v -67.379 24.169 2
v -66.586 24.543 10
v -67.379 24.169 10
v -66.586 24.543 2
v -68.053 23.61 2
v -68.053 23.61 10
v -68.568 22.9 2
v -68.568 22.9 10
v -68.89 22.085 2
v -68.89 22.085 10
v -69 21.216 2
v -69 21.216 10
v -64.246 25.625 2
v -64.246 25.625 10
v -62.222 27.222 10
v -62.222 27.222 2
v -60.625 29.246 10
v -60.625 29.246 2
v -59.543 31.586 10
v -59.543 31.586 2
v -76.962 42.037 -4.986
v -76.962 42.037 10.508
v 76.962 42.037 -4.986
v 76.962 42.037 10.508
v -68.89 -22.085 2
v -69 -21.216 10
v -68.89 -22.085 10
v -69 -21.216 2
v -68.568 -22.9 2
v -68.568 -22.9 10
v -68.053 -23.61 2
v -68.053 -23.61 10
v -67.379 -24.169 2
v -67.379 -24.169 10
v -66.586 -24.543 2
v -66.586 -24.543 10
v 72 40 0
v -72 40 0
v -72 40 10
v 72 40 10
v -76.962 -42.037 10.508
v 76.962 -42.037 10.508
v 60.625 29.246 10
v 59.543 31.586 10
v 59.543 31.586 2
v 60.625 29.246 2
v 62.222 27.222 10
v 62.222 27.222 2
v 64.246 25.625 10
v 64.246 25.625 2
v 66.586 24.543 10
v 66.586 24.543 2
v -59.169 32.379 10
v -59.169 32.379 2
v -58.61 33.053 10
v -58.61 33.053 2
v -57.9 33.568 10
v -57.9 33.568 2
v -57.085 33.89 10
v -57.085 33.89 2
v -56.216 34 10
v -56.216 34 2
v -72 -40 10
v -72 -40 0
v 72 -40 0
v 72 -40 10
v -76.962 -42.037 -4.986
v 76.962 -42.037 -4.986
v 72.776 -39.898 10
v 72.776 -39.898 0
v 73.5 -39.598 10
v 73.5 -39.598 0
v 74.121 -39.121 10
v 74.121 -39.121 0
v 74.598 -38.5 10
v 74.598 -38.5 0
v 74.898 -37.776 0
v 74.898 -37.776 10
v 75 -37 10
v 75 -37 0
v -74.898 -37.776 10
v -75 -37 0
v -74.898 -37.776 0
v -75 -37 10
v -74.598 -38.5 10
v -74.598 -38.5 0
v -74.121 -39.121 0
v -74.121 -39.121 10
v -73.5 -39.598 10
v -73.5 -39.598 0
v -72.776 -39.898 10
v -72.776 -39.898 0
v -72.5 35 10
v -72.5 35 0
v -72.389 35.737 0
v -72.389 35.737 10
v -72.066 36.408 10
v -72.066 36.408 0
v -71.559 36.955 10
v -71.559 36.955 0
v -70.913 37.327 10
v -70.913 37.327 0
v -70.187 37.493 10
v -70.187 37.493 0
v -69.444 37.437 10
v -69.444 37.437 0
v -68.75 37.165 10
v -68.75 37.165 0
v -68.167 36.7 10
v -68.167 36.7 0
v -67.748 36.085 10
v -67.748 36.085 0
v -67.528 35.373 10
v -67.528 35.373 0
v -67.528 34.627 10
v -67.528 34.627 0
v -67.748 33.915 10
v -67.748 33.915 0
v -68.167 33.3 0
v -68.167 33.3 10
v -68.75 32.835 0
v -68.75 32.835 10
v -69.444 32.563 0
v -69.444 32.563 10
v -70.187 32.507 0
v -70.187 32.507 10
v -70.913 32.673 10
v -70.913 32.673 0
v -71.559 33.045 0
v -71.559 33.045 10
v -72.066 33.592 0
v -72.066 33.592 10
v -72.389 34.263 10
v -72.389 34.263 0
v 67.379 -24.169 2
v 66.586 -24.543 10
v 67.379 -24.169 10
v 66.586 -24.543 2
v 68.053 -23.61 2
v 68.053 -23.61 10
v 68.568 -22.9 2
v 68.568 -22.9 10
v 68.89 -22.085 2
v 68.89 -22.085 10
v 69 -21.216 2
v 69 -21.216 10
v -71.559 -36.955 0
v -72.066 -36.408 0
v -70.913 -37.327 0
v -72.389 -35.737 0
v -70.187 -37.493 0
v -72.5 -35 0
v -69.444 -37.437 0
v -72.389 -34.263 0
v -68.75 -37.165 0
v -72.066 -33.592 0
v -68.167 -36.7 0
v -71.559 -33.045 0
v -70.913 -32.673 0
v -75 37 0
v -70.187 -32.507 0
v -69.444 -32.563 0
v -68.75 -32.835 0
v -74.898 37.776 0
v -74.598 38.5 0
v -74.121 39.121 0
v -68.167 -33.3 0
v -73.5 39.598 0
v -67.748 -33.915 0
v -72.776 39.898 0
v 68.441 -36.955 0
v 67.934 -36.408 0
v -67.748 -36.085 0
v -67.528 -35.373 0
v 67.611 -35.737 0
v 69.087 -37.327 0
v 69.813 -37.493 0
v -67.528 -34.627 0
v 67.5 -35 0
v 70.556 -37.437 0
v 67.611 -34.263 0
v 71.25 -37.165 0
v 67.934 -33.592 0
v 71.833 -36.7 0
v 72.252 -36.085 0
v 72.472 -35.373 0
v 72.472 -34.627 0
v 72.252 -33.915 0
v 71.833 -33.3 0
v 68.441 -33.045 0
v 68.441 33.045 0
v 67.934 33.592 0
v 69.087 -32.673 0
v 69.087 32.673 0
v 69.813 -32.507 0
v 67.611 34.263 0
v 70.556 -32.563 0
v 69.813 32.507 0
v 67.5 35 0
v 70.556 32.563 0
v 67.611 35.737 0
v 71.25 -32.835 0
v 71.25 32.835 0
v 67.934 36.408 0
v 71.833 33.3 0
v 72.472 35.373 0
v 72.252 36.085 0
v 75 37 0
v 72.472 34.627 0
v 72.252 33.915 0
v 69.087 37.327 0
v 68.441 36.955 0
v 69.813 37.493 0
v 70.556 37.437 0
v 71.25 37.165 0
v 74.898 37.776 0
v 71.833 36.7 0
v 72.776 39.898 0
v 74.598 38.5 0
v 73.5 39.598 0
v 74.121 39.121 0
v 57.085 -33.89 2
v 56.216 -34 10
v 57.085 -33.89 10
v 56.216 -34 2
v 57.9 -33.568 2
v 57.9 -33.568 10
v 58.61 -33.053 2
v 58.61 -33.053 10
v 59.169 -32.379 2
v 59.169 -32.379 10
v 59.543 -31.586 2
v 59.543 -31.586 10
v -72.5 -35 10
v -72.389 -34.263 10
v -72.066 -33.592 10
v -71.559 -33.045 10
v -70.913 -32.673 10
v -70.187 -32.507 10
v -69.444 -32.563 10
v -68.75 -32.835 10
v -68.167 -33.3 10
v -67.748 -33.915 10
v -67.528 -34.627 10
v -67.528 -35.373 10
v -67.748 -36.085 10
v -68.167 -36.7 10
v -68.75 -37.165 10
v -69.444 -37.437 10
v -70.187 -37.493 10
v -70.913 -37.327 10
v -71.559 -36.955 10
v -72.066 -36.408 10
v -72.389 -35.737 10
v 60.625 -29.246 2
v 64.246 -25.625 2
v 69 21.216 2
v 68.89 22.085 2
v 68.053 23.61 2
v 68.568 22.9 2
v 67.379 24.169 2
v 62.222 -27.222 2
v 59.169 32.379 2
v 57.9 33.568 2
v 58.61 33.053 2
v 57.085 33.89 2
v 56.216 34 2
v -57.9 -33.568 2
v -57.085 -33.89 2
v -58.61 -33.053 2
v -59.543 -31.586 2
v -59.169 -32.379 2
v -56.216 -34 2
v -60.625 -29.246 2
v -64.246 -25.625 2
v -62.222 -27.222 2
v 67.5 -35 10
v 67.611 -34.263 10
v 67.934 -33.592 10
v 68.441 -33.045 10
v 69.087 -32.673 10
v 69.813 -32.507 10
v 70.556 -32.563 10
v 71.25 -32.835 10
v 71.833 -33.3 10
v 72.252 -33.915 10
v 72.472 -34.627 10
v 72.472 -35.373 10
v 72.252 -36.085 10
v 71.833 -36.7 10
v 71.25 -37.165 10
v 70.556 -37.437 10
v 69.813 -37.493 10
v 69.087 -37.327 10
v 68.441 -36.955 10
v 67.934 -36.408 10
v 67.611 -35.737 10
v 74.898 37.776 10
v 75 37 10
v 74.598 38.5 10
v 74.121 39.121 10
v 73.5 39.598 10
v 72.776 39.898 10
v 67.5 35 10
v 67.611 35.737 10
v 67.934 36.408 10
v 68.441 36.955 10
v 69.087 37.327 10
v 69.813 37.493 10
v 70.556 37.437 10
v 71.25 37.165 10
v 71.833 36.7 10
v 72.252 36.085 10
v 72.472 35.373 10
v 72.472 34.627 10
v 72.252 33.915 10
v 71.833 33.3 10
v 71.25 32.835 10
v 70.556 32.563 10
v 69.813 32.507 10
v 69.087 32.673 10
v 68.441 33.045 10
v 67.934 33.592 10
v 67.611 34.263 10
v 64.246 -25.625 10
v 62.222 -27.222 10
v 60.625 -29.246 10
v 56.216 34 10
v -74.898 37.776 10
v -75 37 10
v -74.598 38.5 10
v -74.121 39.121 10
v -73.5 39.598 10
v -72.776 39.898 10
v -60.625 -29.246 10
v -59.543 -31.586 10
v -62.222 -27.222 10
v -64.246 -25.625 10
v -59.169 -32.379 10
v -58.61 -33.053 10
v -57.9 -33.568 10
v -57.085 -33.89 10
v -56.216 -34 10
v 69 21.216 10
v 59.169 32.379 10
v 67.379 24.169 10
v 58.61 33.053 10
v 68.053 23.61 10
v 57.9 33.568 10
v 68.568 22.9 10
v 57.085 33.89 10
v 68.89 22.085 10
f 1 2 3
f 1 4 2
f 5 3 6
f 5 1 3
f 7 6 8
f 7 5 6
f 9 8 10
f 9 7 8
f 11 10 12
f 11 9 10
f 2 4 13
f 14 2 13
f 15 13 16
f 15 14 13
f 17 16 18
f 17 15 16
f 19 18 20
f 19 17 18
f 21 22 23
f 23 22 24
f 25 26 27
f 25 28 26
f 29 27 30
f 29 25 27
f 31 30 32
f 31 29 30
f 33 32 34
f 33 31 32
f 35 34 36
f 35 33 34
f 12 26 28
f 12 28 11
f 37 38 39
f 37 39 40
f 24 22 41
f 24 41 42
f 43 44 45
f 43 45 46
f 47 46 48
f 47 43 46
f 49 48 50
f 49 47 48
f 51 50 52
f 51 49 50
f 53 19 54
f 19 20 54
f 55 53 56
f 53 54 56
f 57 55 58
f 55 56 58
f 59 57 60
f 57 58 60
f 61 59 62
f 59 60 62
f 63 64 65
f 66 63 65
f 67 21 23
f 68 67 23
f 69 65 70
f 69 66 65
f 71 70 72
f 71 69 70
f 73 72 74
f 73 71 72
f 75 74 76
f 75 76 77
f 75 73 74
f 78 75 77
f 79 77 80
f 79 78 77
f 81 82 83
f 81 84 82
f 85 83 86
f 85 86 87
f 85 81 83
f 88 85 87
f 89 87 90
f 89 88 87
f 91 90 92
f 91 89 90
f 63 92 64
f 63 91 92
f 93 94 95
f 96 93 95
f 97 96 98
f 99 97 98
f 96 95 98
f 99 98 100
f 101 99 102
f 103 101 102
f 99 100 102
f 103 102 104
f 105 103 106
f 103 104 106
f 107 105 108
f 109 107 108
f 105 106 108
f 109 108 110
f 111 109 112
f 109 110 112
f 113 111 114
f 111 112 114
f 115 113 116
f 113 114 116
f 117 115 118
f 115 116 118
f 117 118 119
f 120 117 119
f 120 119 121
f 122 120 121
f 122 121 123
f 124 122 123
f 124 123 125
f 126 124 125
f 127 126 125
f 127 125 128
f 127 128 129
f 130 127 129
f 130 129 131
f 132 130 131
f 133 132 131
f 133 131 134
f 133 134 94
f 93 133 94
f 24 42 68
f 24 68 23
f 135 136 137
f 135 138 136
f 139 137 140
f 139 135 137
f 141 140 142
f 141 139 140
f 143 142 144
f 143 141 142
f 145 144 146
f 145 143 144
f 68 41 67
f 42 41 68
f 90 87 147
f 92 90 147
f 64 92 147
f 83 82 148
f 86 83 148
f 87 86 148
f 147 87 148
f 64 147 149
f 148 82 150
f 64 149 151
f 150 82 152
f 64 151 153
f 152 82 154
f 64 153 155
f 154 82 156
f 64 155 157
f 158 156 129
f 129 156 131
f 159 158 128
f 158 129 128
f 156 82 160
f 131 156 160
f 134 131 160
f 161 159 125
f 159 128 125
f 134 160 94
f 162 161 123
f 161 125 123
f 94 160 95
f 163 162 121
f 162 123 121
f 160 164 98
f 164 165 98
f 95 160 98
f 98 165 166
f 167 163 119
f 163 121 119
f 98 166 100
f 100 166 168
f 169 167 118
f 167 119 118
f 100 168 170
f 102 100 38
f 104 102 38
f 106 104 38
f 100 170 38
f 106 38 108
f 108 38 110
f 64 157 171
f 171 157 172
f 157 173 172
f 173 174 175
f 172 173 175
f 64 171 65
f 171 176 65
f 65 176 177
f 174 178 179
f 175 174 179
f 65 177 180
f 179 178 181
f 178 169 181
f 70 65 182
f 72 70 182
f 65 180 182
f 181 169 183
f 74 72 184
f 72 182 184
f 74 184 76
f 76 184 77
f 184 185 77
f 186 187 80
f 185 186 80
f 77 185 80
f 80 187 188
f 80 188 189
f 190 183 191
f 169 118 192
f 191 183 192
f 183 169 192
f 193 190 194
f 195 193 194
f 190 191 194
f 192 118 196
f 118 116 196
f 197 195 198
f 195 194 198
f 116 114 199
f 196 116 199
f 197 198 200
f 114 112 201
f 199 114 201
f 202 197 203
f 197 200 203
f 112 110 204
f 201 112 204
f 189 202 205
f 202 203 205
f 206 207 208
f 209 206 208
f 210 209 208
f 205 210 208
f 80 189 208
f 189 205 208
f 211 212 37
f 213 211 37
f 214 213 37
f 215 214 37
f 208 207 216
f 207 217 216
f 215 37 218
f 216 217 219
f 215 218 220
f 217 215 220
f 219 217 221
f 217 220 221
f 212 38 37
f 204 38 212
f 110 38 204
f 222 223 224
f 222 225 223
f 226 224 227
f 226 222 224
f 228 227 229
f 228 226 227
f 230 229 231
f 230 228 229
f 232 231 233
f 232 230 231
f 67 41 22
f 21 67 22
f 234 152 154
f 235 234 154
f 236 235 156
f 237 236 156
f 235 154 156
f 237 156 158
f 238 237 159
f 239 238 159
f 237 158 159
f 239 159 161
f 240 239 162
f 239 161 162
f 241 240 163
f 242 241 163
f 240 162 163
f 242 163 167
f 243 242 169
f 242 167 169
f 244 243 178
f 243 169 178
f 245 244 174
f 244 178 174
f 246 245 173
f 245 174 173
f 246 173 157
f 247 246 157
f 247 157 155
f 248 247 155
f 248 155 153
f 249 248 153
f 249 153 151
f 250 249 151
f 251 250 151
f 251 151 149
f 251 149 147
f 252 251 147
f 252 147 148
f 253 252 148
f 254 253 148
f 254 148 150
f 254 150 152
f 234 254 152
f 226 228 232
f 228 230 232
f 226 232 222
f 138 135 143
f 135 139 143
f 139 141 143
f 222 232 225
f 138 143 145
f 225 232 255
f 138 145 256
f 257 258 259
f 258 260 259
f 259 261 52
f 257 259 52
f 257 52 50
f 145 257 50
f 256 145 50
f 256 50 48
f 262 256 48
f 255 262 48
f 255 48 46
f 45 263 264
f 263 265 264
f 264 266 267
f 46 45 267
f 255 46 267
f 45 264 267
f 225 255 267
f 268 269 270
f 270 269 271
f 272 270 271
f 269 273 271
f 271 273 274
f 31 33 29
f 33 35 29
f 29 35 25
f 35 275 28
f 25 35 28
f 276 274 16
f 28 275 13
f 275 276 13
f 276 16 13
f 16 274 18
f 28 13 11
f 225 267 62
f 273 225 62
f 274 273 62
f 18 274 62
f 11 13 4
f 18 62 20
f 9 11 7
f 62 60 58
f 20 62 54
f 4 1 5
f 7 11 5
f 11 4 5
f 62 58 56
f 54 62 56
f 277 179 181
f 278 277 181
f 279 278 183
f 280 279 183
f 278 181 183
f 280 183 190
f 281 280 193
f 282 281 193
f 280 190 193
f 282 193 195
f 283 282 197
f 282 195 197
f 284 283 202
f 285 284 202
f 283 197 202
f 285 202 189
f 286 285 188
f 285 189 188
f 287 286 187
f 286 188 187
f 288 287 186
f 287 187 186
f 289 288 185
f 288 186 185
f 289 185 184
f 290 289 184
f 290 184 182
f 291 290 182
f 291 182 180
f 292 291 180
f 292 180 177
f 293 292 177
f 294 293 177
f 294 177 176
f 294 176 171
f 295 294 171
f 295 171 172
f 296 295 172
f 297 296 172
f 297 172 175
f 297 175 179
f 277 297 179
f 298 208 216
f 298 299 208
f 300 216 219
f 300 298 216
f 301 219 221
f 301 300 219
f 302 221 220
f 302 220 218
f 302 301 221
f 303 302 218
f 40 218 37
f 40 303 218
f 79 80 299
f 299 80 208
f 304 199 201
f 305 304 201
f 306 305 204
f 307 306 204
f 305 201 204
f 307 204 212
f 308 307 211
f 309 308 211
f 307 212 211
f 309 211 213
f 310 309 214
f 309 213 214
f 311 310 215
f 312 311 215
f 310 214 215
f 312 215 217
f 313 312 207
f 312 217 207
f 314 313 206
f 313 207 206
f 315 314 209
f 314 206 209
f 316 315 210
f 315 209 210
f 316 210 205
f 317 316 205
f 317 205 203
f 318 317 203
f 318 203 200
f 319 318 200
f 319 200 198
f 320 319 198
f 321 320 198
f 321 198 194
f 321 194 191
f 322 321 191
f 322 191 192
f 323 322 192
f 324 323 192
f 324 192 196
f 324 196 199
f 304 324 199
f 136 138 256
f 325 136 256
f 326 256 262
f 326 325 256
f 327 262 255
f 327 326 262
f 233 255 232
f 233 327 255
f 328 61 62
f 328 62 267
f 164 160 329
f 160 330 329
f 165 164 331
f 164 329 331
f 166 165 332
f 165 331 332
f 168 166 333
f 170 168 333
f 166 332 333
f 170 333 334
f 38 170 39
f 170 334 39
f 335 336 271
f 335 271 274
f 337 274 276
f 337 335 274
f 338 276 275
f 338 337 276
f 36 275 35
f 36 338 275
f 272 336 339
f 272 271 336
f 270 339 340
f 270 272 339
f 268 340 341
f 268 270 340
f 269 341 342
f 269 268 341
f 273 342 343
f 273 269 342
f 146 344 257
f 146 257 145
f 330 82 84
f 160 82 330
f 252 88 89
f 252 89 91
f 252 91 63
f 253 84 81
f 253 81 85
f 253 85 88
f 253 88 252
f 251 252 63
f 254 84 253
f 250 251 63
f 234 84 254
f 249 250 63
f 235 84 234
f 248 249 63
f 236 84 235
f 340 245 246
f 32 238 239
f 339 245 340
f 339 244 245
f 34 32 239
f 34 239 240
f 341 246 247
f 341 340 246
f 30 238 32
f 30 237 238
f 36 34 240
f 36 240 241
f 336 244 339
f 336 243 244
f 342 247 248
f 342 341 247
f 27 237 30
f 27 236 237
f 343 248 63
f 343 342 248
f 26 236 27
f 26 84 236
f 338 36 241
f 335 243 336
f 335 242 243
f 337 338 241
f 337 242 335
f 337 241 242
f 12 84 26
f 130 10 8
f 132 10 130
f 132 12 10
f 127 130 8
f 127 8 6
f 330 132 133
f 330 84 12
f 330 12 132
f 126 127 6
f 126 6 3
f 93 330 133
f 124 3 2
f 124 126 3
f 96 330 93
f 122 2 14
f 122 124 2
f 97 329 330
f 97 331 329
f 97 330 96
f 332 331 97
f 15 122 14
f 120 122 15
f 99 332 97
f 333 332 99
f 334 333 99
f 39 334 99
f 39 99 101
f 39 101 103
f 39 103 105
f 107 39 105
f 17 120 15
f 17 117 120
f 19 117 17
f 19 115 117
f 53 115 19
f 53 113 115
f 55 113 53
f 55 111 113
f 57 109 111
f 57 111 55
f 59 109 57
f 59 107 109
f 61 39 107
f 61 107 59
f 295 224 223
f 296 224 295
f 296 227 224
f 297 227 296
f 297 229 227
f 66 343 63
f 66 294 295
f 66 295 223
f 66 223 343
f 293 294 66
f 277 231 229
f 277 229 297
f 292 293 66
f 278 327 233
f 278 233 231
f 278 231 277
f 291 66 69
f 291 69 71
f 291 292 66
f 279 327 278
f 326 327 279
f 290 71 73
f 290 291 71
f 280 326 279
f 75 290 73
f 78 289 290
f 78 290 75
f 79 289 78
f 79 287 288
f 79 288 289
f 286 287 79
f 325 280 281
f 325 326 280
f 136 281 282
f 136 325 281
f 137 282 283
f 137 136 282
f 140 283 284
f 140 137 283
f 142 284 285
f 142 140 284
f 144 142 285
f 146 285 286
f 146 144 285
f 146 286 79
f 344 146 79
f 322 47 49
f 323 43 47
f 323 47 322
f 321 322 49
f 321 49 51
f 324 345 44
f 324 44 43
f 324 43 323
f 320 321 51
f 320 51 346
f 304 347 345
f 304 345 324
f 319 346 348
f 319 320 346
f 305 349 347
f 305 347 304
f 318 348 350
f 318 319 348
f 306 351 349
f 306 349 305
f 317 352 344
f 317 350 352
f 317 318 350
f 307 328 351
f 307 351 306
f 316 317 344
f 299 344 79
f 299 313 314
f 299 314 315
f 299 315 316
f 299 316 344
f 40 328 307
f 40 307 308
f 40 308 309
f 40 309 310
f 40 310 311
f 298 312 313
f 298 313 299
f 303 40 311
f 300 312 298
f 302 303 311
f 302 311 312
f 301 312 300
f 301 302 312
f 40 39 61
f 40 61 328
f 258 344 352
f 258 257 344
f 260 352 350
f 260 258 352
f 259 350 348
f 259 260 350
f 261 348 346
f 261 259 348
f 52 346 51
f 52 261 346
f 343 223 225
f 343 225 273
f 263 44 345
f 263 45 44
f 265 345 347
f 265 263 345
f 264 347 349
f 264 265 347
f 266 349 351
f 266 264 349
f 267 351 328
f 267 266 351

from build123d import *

# Parameters (mm, degrees)
SKETCH1_W                = 150
SKETCH1_H                = 80
BOSS_EXTRUDE1_DEPTH      = 10
FILLET1_R                = 3
F_5_0_5_DIAMETER_HOLE1_D = 5
CUT_EXTRUDE1_DEPTH       = 8
FILLET2_R                = 3.5
SKETCH8_W                = 153.924
SKETCH8_H                = 84.074
BOSS_EXTRUDE3_DEPTH      = 0.508
BOSS_EXTRUDE3_DEPTH_BACK = 14.986


with BuildPart() as part:
    # Sketch1 → Boss-Extrude1 (new body)
    with BuildSketch(Plane.XY):
        Rectangle(SKETCH1_W, SKETCH1_H)
    extrude(amount=BOSS_EXTRUDE1_DEPTH)

    # Fillet1
    fillet1_edges = [part.edges().sort_by_distance(p)[0] for p in [
        (75, -40, 5),
        (-75, -40, 5),
        (-75, 40, 5),
        (75, 40, 5),
    ]]
    fillet(fillet1_edges, radius=FILLET1_R)

    # Ø5.0 (5) Diameter Hole1 (through all)
    with Locations(Plane.XY.offset(10)):
        with Locations((-70, -35), (-70, 35), (70, 35), (70, -35)):
            Hole(F_5_0_5_DIAMETER_HOLE1_D / 2)

    # Sketch5 → Cut-Extrude1 (cut)
    with BuildSketch(Plane.XY.offset(10)):
        with BuildLine():
            Line((-59.04554885, 34), (59.04554885, 34))
            ThreePointArc((59.04554885, 34), (62.221825407, 27.221825407), (69, 24.04554885))
            Line((69, 24.04554885), (69, -24.04554885))
            ThreePointArc((69, -24.04554885), (62.221825407, -27.221825407), (59.04554885, -34))
            Line((59.04554885, -34), (-59.04554885, -34))
            ThreePointArc((-59.04554885, -34), (-62.221825407, -27.221825407), (-69, -24.04554885))
            Line((-69, -24.04554885), (-69, 24.04554885))
            ThreePointArc((-69, 24.04554885), (-62.221825407, 27.221825407), (-59.04554885, 34))
        make_face()
    extrude(amount=-CUT_EXTRUDE1_DEPTH, mode=Mode.SUBTRACT)

    # Fillet2
    fillet2_edges = [part.edges().sort_by_distance(p)[0] for p in [
        (-69, 24.04554885, 6),
        (-59.04554885, 34, 6),
        (59.04554885, 34, 6),
        (69, 24.04554885, 6),
        (69, -24.04554885, 6),
        (59.04554885, -34, 6),
        (-59.04554885, -34, 6),
        (-69, -24.04554885, 6),
    ]]
    fillet(fillet2_edges, radius=FILLET2_R)


with BuildPart() as body_2:
    # Sketch8 → Boss-Extrude3 (new body, two sides)
    with BuildSketch(Plane.XY.offset(10)) as boss_extrude3_sk:
        Rectangle(SKETCH8_W, SKETCH8_H)
    extrude(amount=BOSS_EXTRUDE3_DEPTH)
    extrude(boss_extrude3_sk.sketch, amount=-BOSS_EXTRUDE3_DEPTH_BACK)


solid = Compound([part.part, body_2.part])
